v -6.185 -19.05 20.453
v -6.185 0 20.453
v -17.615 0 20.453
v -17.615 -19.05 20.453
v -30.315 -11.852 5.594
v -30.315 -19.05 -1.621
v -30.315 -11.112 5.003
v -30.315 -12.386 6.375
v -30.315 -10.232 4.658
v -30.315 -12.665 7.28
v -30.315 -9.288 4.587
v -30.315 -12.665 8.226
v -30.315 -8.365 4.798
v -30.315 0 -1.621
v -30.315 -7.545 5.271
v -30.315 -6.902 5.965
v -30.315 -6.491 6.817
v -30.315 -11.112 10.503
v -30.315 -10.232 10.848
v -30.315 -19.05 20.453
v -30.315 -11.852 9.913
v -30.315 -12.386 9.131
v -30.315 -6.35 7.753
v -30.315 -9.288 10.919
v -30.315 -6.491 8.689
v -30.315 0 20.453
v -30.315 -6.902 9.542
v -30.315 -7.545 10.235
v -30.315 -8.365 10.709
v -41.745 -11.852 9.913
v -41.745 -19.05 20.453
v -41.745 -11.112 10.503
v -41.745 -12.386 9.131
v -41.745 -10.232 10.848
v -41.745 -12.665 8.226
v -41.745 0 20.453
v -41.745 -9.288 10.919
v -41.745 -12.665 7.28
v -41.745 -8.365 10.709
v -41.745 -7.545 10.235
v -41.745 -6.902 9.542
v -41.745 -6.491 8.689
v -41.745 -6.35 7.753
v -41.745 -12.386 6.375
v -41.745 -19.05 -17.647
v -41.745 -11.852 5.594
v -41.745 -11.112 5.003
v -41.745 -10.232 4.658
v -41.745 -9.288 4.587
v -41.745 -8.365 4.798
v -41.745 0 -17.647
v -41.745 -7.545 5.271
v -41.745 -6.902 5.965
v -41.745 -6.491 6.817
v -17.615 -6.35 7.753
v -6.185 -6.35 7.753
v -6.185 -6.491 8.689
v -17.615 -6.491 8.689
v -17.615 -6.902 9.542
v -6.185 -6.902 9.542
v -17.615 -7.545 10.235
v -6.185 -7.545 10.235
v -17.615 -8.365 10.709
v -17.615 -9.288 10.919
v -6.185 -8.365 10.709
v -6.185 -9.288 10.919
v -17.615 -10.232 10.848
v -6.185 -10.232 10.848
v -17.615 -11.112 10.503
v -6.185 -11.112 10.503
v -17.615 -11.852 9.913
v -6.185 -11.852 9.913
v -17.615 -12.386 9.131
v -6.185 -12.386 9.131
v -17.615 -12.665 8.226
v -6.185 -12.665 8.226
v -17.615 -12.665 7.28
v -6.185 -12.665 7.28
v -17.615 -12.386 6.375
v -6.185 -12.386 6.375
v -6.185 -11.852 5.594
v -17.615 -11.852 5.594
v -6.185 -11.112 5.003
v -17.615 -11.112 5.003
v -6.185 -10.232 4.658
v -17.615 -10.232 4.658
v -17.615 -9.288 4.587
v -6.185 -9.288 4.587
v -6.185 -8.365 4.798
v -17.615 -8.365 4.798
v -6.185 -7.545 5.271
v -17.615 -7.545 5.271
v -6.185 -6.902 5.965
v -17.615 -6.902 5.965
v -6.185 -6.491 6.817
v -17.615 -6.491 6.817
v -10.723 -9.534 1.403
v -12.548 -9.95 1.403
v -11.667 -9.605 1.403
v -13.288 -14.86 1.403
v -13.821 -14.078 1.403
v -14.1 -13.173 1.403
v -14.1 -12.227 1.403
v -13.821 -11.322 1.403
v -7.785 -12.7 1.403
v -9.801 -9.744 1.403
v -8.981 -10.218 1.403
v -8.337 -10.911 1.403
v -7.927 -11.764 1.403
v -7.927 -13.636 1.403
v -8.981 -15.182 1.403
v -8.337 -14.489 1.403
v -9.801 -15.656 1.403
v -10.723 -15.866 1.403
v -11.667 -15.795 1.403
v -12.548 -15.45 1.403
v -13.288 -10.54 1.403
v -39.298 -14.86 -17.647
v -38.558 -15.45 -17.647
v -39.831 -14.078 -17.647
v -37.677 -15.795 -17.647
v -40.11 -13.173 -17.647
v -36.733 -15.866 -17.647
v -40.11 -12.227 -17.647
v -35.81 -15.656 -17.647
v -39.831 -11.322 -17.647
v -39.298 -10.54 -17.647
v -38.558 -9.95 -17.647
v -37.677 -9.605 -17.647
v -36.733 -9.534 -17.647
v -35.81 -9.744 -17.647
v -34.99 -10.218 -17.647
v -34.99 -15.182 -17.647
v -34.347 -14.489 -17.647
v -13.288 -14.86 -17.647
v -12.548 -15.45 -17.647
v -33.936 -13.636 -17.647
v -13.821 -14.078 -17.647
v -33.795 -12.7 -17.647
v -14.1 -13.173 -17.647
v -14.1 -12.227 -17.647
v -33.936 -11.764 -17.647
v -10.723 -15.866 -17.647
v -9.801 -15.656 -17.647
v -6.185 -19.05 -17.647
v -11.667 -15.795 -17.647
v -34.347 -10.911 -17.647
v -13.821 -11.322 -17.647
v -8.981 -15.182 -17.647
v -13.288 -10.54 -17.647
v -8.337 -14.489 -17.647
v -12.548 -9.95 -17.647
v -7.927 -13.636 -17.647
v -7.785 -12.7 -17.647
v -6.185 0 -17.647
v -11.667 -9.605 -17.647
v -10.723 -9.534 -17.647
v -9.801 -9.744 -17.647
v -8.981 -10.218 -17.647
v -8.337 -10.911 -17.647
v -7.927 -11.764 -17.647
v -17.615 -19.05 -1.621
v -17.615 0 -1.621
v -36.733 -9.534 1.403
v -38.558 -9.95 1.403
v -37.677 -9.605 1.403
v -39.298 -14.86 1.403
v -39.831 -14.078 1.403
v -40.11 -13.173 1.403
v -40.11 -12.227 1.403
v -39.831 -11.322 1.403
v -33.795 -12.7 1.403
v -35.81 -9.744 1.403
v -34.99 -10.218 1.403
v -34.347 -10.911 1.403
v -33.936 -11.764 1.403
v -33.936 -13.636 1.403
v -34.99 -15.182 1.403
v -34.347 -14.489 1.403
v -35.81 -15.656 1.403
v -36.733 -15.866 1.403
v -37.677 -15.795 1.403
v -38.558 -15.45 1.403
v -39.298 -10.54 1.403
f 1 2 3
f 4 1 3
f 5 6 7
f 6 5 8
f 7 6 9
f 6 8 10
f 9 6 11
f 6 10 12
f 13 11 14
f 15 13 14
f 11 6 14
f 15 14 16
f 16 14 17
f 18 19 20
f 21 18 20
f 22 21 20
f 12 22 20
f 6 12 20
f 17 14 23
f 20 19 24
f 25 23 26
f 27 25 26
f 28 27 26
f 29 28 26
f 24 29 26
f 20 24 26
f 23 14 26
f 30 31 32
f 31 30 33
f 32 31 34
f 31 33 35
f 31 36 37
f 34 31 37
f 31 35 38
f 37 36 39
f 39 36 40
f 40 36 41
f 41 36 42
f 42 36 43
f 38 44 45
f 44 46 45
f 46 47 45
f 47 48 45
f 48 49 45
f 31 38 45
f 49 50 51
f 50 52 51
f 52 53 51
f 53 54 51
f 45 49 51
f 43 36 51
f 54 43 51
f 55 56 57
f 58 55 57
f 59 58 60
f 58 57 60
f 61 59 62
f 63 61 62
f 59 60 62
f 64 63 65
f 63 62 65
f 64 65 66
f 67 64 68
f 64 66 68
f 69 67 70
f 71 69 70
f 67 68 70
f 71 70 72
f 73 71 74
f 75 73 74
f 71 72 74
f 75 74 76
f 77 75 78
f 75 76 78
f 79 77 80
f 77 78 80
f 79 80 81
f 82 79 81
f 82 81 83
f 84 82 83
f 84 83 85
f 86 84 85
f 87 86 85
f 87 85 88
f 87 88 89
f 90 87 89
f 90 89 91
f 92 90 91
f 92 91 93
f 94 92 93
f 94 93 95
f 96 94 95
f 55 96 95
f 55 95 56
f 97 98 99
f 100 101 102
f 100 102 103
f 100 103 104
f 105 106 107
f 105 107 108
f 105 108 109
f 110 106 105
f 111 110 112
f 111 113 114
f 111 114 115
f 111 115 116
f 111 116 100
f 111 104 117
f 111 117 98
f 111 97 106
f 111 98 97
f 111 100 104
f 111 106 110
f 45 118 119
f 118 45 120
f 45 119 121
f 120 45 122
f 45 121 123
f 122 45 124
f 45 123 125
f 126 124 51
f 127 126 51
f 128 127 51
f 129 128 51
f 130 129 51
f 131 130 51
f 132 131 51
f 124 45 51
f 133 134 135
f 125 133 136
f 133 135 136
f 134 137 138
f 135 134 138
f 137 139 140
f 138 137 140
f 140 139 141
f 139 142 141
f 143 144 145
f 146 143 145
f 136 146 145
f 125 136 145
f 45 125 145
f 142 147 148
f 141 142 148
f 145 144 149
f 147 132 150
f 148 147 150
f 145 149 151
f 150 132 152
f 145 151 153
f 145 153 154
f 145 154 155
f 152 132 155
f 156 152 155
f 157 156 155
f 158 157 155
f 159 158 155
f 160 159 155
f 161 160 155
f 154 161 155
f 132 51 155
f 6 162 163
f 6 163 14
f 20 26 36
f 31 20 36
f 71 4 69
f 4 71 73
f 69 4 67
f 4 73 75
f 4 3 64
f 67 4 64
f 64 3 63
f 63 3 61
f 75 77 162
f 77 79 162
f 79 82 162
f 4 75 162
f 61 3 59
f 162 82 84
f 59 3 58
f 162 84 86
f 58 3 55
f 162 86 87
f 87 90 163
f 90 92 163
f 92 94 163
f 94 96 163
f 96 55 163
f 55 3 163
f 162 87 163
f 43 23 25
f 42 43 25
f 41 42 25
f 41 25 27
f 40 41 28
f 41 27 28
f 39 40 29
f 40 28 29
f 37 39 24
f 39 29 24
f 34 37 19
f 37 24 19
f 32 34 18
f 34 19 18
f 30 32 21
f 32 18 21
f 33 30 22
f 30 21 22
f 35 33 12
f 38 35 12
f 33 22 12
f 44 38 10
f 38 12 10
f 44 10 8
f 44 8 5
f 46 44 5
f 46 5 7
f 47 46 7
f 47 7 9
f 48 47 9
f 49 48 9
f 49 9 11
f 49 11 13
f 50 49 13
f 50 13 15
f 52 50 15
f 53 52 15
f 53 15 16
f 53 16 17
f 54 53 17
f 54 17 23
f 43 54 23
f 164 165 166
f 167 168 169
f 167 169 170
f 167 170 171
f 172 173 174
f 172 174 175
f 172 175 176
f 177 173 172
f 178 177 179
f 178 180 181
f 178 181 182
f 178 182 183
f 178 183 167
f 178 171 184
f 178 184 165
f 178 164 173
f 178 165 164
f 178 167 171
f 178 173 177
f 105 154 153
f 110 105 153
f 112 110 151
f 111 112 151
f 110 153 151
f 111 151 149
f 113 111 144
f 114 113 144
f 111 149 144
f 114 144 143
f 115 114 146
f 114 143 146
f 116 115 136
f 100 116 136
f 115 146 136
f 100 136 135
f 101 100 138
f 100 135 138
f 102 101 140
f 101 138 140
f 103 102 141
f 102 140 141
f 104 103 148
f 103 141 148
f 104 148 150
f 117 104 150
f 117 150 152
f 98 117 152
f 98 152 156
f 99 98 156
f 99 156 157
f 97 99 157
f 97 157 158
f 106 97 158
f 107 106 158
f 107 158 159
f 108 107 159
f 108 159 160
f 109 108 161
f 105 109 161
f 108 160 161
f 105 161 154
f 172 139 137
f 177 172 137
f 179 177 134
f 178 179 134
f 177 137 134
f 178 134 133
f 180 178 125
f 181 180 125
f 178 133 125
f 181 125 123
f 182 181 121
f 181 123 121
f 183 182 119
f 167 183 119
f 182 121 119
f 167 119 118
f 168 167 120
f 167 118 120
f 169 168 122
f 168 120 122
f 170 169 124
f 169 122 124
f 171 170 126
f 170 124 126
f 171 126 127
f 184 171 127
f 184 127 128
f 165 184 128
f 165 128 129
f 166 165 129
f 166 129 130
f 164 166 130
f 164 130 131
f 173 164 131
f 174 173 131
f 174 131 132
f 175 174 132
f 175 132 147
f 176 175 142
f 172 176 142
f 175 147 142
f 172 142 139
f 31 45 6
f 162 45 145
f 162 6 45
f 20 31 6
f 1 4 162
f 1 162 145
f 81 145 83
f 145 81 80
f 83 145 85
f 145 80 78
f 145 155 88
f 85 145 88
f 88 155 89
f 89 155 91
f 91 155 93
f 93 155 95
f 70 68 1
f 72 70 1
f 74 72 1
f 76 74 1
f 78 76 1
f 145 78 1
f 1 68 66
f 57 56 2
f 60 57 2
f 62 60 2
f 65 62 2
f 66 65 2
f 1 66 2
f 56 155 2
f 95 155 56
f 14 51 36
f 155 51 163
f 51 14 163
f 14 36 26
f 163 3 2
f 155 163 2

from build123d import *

# Parameters (mm, degrees)
F1_DEPTH = 19.05
F2_R     = 3.175
F3_DEPTH = 35.561
F4_R     = 3.175
F5_DEPTH = 19.05


with BuildPart() as f1:
    # F0 (on Front) → F1 (new body)
    with BuildSketch(Plane.XZ):
        Polygon((-30.315266, 20.453066), (-41.745266, 20.453066), (-41.745266, -17.646934), (-6.185266, -17.646934), (-6.185266, 20.453066), (-17.615266, 20.453066), (-17.615266, -1.620747), (-30.315266, -1.620747), align=None)
    extrude(amount=F1_DEPTH)

    # F2 (on face) → F3 (cut, through all)
    with BuildSketch(Plane.YZ.offset(-6.185266)):
        with Locations((-9.525, 7.753066)):
            Circle(F2_R)
    extrude(amount=-F3_DEPTH, mode=Mode.SUBTRACT)

    # F4 (on face) → F5 (cut)
    with BuildSketch(Plane(origin=(0, 0, -17.646934), x_dir=(1, 0, 0), z_dir=(0, 0, -1))):
        with Locations((-36.970066, 12.7)):
            Circle(F4_R)
        with Locations((-10.960466, 12.7)):
            Circle(F4_R)
    extrude(amount=-F5_DEPTH, mode=Mode.SUBTRACT)


solid = f1.part
